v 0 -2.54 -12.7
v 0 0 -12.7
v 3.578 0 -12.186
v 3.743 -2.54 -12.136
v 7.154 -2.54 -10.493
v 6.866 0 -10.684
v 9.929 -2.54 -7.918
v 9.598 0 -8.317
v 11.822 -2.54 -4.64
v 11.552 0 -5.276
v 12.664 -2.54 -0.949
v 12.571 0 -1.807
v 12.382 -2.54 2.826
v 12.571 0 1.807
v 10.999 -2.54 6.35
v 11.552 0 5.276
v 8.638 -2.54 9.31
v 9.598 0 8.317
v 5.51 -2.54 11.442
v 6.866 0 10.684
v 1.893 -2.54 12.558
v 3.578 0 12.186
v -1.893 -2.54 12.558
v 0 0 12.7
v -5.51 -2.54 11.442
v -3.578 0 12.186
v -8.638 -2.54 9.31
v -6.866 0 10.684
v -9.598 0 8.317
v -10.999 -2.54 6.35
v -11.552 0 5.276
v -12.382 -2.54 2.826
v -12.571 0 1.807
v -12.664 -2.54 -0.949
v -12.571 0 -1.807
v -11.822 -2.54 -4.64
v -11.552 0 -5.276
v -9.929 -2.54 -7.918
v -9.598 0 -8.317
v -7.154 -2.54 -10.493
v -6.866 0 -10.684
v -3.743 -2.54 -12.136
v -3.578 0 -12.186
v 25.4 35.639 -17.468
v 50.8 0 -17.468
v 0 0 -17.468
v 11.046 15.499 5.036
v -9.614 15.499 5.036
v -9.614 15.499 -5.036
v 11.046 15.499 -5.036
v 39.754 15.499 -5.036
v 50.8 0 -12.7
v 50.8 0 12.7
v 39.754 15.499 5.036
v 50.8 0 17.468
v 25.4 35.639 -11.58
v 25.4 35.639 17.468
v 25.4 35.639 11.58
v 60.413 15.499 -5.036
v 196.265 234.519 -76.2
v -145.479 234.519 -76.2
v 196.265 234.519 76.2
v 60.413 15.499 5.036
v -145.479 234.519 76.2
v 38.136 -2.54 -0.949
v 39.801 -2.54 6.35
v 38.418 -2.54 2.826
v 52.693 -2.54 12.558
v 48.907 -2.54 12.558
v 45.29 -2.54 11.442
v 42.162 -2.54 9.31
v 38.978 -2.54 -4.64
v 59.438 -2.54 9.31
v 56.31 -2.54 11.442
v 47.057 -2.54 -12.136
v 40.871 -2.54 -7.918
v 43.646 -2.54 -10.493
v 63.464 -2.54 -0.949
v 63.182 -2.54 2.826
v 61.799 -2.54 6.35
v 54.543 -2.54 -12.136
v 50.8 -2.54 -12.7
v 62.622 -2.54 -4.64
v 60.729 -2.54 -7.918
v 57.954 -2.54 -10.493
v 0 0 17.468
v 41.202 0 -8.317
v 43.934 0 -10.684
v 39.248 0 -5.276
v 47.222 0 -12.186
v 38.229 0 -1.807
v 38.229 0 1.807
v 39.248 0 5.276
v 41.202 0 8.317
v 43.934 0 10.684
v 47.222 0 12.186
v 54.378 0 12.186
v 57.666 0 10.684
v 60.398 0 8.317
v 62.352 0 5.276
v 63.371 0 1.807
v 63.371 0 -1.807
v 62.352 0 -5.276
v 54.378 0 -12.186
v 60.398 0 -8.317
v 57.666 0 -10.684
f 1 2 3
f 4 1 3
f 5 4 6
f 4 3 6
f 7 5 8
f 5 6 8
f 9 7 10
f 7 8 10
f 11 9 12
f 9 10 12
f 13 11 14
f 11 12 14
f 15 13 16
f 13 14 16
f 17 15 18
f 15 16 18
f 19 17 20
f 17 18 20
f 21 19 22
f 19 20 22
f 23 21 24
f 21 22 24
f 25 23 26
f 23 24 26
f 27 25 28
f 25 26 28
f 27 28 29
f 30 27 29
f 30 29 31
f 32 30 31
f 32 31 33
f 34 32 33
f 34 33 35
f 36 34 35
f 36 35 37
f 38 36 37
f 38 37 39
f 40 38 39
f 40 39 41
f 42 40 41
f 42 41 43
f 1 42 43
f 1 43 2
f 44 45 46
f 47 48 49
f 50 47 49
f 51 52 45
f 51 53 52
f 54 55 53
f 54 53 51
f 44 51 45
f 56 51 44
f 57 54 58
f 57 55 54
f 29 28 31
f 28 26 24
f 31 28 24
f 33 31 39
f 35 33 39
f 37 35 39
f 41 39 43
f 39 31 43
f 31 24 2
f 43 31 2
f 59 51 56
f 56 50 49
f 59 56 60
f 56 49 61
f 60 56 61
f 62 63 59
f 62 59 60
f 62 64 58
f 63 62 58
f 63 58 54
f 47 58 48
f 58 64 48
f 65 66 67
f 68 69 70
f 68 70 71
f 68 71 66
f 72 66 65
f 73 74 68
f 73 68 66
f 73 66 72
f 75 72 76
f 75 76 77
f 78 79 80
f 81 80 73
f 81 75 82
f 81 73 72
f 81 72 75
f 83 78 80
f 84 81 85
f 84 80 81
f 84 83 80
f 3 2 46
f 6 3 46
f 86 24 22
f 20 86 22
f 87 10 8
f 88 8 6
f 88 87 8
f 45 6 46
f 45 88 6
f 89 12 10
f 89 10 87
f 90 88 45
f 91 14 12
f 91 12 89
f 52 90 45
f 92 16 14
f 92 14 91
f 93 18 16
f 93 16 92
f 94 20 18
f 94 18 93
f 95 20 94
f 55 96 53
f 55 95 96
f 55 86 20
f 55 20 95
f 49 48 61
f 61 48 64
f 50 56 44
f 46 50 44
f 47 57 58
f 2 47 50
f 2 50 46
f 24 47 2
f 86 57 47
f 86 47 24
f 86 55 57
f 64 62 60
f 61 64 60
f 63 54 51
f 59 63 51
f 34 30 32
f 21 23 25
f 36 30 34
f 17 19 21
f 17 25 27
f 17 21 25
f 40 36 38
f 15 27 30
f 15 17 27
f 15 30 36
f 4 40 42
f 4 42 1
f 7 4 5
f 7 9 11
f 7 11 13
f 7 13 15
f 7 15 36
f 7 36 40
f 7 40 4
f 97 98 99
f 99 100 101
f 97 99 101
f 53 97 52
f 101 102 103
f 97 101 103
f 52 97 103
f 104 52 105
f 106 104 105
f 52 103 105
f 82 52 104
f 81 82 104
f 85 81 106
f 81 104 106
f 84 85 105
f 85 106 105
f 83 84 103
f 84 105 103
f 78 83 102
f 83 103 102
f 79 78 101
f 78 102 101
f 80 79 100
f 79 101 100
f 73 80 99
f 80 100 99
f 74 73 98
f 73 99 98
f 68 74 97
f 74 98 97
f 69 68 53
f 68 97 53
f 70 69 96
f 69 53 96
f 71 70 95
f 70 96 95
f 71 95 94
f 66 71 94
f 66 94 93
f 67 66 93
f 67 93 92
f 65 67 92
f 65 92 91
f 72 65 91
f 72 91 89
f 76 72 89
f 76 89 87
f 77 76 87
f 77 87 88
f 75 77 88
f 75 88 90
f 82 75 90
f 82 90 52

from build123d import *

# Parameters (mm, degrees)
BOSS_EXTRUDE1_DEPTH      = 76.2
BOSS_EXTRUDE6_DEPTH      = 203.2
BOSS_EXTRUDE6_DEPTH_BACK = 152.4
CUT_EXTRUDE1_DEPTH       = 397.760683536
SKETCH9_W                = 152.4
SKETCH9_H                = 70.280514467
CUT_EXTRUDE2_DEPTH       = 475.511158984
SKETCH10_R               = 12.7
BOSS_EXTRUDE7_DEPTH      = 2.54
SKETCH11_W               = 58.732266579
SKETCH11_H               = 35.638828091
CUT_EXTRUDE3_DEPTH       = 316.168697926


with BuildPart() as part:
    # Sketch1 → Boss-Extrude1 (new, symmetric)
    with BuildSketch(Plane.XY):
        Polygon((0, 0), (50.8, 0), (25.4, 35.638828091), align=None)
    extrude(amount=BOSS_EXTRUDE1_DEPTH, both=True)

    # Sketch7 → Boss-Extrude6 (add, two sides: drawn at the far end of the back side and taken through both)
    with BuildSketch(Plane(origin=(0, 0, 0), x_dir=(0, 0, -1), z_dir=(1, 0, 0)).offset(-BOSS_EXTRUDE6_DEPTH_BACK)):
        Polygon((76.2, 234.519485533), (76.2, 304.8), (-76.2, 304.8), (-76.2, 234.519485533), (-5.035820147, 15.498660762), (5.035820147, 15.498660762), align=None)
    extrude(amount=BOSS_EXTRUDE6_DEPTH + BOSS_EXTRUDE6_DEPTH_BACK)

    # Sketch8 → Cut-Extrude1 (cut, through all)
    with BuildSketch(Plane.XY.offset(76.2)):
        Polygon((-145.479084616, 234.519485533), (-152.4, 234.519485533), (-152.4, 15.498660762), (-9.614258599, 15.498660762), align=None)
        Polygon((60.413322139, 15.498660762), (196.264914484, 234.519485533), (203.2, 234.519485533), (203.2, 15.498660762), align=None)
    extrude(amount=-CUT_EXTRUDE1_DEPTH, mode=Mode.SUBTRACT)

    # Sketch9 → Cut-Extrude2 (cut, through all)
    with BuildSketch(Plane(origin=(203.2, 0, 0), x_dir=(0, 0, -1), z_dir=(1, 0, 0))):
        with Locations((0, 269.659742767)):
            Rectangle(SKETCH9_W, SKETCH9_H)
    extrude(amount=-CUT_EXTRUDE2_DEPTH, mode=Mode.SUBTRACT)

    # Sketch10 → Boss-Extrude7 (add)
    with BuildSketch(Plane(origin=(0, 0, 0), x_dir=(-1, 0, 0), z_dir=(0, -1, 0))):
        with Locations(Location((0, 0, 0), (0, 0, 90))):
            Circle(SKETCH10_R)
        with Locations(Location((-50.8, 0, 0), (0, 0, 90))):
            Circle(SKETCH10_R)
    extrude(amount=BOSS_EXTRUDE7_DEPTH)

    # Sketch11 → Cut-Extrude3 (cut, through all)
    with BuildSketch(Plane(origin=(50.8, 0, 0), x_dir=(0, 0, -1), z_dir=(1, 0, 0))):
        with Locations((-46.833866711, 17.819414046)):
            Rectangle(SKETCH11_W, SKETCH11_H)
        with Locations((46.833866711, 17.819414046)):
            Rectangle(SKETCH11_W, SKETCH11_H)
    extrude(amount=-CUT_EXTRUDE3_DEPTH, mode=Mode.SUBTRACT)


solid = part.part
